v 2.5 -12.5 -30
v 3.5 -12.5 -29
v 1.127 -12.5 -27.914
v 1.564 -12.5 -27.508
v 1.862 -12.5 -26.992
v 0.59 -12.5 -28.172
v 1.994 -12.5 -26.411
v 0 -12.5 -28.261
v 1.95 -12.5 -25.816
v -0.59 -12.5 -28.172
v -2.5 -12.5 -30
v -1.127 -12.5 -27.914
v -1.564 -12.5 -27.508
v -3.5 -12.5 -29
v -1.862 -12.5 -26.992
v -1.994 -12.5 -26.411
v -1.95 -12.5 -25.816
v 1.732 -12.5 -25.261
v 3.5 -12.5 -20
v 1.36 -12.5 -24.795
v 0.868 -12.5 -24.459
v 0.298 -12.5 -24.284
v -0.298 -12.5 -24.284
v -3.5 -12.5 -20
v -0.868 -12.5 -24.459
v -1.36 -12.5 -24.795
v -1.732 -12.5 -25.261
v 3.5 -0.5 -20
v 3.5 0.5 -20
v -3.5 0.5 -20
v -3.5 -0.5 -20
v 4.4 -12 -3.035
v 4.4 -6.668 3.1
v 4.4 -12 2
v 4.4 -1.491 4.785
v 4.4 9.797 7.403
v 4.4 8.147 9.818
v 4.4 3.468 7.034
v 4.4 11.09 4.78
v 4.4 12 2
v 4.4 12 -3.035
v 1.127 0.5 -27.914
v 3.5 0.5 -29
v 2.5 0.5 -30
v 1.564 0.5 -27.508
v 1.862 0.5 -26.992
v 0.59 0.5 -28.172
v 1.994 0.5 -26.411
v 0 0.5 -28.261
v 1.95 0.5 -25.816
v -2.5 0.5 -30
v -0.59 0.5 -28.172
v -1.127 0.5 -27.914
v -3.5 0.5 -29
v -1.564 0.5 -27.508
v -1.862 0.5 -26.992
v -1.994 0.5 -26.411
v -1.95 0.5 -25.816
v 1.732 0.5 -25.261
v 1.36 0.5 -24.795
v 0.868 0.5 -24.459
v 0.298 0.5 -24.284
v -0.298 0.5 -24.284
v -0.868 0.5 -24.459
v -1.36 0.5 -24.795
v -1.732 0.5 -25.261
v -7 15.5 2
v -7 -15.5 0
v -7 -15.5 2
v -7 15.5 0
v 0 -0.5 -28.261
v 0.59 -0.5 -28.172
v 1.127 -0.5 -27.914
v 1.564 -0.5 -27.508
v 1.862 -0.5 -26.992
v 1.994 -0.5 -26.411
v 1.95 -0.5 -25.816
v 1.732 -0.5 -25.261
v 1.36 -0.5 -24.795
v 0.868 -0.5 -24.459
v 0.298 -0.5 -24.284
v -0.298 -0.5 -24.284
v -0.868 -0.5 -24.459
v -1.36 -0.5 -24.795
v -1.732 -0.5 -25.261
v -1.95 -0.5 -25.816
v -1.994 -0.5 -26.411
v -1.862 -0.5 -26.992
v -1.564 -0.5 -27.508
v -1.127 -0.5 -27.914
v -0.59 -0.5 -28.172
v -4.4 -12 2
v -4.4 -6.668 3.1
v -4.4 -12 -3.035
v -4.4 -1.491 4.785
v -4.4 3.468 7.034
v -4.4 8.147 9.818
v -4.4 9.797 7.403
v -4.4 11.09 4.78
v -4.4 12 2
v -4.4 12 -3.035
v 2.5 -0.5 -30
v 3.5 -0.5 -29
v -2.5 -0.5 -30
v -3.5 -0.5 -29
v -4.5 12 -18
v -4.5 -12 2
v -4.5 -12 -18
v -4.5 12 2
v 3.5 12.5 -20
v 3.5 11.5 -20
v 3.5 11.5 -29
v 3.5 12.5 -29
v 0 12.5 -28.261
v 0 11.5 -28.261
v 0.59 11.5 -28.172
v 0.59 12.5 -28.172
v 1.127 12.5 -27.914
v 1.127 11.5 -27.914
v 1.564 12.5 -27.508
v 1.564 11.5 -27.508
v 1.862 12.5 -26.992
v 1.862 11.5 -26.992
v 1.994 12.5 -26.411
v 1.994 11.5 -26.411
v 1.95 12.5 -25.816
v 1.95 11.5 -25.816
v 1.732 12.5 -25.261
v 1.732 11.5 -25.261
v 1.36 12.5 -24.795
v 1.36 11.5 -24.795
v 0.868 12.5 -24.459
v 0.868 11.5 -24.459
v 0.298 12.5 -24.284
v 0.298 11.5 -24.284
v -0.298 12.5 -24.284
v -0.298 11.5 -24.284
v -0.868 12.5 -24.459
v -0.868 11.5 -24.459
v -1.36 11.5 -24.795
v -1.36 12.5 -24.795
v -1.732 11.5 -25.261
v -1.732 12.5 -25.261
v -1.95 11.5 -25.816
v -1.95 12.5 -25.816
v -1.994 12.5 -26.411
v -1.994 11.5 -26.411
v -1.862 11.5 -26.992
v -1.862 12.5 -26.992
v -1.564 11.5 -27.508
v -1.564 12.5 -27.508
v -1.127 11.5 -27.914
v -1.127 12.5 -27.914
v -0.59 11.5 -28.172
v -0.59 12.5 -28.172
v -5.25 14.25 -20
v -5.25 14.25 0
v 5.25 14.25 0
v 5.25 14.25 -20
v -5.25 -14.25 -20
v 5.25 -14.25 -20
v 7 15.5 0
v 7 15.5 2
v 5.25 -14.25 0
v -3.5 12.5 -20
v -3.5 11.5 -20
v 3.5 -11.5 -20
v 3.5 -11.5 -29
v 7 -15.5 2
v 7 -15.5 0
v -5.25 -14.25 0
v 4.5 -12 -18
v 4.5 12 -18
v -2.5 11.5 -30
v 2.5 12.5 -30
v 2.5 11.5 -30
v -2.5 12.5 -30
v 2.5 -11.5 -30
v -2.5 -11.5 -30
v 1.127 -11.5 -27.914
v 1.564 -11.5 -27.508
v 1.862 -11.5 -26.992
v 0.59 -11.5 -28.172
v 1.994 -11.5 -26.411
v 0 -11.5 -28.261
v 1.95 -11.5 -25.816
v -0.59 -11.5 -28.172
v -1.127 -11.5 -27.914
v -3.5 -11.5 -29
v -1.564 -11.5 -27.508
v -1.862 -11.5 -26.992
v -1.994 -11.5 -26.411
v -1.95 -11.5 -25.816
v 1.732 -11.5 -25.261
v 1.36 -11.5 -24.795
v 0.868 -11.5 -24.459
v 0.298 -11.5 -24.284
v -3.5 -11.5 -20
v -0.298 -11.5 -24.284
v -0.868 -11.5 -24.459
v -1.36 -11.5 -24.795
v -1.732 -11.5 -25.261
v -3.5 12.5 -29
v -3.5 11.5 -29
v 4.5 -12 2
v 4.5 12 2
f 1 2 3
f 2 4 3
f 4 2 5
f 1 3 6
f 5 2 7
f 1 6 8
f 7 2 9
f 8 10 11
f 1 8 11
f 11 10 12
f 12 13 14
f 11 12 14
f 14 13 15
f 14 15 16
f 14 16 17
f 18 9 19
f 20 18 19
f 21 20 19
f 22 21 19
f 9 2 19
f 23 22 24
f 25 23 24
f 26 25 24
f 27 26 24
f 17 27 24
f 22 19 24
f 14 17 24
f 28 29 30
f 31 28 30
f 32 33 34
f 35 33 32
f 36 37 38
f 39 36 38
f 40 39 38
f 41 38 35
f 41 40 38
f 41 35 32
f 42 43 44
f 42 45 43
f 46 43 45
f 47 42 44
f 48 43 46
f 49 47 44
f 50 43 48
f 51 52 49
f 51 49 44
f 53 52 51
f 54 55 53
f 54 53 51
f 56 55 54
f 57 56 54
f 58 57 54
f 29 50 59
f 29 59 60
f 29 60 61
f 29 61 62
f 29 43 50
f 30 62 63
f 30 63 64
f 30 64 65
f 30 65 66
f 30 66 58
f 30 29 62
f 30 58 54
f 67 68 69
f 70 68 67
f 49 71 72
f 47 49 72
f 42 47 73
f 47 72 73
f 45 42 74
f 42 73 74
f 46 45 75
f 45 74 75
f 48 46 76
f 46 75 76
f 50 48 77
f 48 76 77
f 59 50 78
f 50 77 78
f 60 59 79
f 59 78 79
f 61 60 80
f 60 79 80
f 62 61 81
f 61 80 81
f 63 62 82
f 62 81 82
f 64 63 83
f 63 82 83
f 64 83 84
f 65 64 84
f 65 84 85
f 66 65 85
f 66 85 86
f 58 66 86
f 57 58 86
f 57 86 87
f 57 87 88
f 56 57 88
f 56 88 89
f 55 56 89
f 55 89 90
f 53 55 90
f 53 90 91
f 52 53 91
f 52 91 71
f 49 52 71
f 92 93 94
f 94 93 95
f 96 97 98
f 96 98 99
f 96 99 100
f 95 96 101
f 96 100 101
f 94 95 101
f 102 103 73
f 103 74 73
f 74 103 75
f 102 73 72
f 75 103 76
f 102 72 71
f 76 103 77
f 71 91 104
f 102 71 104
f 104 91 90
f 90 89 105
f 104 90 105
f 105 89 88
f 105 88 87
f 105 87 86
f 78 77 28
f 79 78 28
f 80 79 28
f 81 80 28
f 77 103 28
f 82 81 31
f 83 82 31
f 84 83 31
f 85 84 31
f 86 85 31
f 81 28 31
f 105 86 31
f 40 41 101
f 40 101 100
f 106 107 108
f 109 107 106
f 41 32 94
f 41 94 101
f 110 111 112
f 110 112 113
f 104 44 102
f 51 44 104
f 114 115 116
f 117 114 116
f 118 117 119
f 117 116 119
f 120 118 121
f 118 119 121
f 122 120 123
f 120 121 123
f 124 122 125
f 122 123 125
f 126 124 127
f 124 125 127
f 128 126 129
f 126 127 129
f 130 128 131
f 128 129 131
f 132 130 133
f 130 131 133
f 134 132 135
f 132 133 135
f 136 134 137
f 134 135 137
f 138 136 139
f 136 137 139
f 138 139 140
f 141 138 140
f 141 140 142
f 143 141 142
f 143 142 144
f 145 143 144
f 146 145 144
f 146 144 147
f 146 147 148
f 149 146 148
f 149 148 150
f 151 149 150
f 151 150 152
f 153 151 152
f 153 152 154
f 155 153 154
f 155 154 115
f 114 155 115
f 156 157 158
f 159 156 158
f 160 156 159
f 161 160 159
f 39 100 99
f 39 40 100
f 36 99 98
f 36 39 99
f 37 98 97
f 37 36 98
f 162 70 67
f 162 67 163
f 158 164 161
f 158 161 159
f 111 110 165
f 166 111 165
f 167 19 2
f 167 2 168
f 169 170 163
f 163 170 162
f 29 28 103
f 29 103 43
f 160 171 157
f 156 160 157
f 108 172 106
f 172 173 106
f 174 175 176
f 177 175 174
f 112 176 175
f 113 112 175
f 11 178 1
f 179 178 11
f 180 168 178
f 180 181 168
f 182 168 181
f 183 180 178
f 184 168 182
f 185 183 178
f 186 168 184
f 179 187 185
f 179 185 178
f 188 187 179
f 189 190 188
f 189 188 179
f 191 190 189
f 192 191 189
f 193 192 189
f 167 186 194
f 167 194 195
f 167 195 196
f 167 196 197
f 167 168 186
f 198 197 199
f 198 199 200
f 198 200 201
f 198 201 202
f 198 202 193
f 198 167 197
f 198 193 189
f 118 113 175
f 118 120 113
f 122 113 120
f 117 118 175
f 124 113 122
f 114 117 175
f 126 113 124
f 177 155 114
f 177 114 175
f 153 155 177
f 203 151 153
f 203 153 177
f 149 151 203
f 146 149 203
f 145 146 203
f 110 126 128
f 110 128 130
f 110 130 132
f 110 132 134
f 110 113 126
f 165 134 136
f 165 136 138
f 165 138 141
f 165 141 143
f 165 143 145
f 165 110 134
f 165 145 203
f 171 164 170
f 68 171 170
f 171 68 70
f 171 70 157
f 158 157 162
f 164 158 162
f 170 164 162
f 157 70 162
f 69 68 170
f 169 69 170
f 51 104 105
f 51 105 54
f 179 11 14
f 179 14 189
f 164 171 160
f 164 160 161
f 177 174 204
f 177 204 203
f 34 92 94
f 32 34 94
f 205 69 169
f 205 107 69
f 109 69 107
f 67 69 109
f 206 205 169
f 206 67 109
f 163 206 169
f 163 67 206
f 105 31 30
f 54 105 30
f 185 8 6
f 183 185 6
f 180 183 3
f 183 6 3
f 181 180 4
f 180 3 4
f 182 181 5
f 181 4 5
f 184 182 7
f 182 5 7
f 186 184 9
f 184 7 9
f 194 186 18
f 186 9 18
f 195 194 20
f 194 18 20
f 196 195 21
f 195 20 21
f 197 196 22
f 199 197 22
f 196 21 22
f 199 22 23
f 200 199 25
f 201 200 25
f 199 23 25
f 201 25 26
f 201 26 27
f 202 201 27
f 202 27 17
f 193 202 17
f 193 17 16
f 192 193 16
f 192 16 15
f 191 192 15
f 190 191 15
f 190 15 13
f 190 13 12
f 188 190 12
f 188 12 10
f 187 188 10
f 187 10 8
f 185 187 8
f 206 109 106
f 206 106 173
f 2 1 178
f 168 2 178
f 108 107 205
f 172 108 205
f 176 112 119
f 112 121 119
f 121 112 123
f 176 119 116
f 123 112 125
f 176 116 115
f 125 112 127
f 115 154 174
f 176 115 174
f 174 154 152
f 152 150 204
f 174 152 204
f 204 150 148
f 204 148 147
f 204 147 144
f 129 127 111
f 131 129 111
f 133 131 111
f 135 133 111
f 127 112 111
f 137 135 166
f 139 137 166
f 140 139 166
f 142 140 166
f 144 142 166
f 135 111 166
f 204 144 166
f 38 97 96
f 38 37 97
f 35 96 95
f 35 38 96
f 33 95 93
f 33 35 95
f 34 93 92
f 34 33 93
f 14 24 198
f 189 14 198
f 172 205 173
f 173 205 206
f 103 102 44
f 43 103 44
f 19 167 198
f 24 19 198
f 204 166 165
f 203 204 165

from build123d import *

# Parameters (mm, degrees)
SKETCH1_W           = 14
SKETCH1_H           = 31
SKETCH1_W_2         = 9
SKETCH1_H_2         = 24
BOSS_EXTRUDE1_DEPTH = 2
SKETCH2_W           = 10.5
SKETCH2_H           = 28.5
SKETCH2_W_2         = 9
SKETCH2_H_2         = 24
BOSS_EXTRUDE2_DEPTH = 20
SKETCH3_W           = 10.5
SKETCH3_H           = 28.5
BOSS_EXTRUDE3_DEPTH = 2
SKETCH4_W           = 7
SKETCH4_H           = 1
BOSS_EXTRUDE4_DEPTH = 10
CHAMFER1_SIZE       = 1
LPATTERN1_COUNT     = 2
LPATTERN1_PITCH     = 12
LPATTERN1_2_COUNT   = 2
LPATTERN1_2_PITCH   = 12
SKETCH6_R           = 2
CUT_EXTRUDE1_DEPTH  = 42.629316593
BOSS_EXTRUDE5_DEPTH = 4.4


with BuildPart() as part:
    # Sketch1 → Boss-Extrude1 (new body)
    with BuildSketch(Plane.XY):
        Rectangle(SKETCH1_W, SKETCH1_H)
        Rectangle(SKETCH1_W_2, SKETCH1_H_2, mode=Mode.SUBTRACT)
    extrude(amount=BOSS_EXTRUDE1_DEPTH)

    # Sketch2 → Boss-Extrude2 (add)
    with BuildSketch(Plane.XY):
        Rectangle(SKETCH2_W, SKETCH2_H)
        Rectangle(SKETCH2_W_2, SKETCH2_H_2, mode=Mode.SUBTRACT)
    extrude(amount=-BOSS_EXTRUDE2_DEPTH)

    # Sketch3 → Boss-Extrude3 (add)
    with BuildSketch(Plane(origin=(0, 0, -20), x_dir=(-1, 0, 0), z_dir=(0, 0, -1))):
        Rectangle(SKETCH3_W, SKETCH3_H)
    extrude(amount=-BOSS_EXTRUDE3_DEPTH)


with BuildPart() as body_2:
    # Sketch4 → Boss-Extrude4 (new body)
    with BuildSketch(Plane(origin=(0, 0, -20), x_dir=(-1, 0, 0), z_dir=(0, 0, -1))):
        Rectangle(SKETCH4_W, SKETCH4_H)
    extrude(amount=BOSS_EXTRUDE4_DEPTH)

    # Chamfer1
    chamfer1_edges = [body_2.edges().sort_by_distance(p)[0] for p in [
        (3.5, 0, -30),
        (-3.5, 0, -30),
    ]]
    chamfer(chamfer1_edges, length=CHAMFER1_SIZE)


with BuildPart() as lpattern1_1:
    # LPattern1: pattern copy
    add(body_2.part.moved(Location(Vector(0, -1, 0) * (1 * LPATTERN1_PITCH))))


with BuildPart() as lpattern1_2_1:
    # LPattern1 2: pattern copy
    add(body_2.part.moved(Location(Vector(0, 1, 0) * (1 * LPATTERN1_2_PITCH))))


with BuildPart() as cut_extrude1_tool:
    # Sketch6 → Cut-Extrude1 (new, through all)
    with BuildSketch(Plane.XZ.offset(12.5)):
        with Locations(Location((0, -26.261190852, 0), (0, 0, 270))):
            Circle(SKETCH6_R)
    extrude(amount=-CUT_EXTRUDE1_DEPTH)


with BuildPart() as body_2_1:
    add(body_2.part)

    # Cut-Extrude1: cut by cut_extrude1_tool
    add(cut_extrude1_tool.part, mode=Mode.SUBTRACT)


with BuildPart() as lpattern1_1_1:
    add(lpattern1_1.part)

    # Cut-Extrude1: cut by cut_extrude1_tool
    add(cut_extrude1_tool.part, mode=Mode.SUBTRACT)


with BuildPart() as lpattern1_2_1_1:
    add(lpattern1_2_1.part)

    # Cut-Extrude1: cut by cut_extrude1_tool
    add(cut_extrude1_tool.part, mode=Mode.SUBTRACT)


with BuildPart() as body_5:
    # Sketch7 → Boss-Extrude5 (new, symmetric)
    with BuildSketch(Plane(origin=(0, 0, 0), x_dir=(0, 0, -1), z_dir=(1, 0, 0))):
        with BuildLine():
            Line((-2, -12), (3.035249644, -12))
            Line((3.035249644, -12), (3.035249644, 12))
            Line((3.035249644, 12), (-2, 12))
            ThreePointArc((-2, 12), (-6.114287528, 10.489568636), (-9.818258603, 8.14662966))
            ThreePointArc((-9.818258603, 8.14662966), (-4.785245382, -1.49054199), (-2, -12))
        make_face()
    extrude(amount=BOSS_EXTRUDE5_DEPTH, both=True)


solid = Compound([part.part, body_2_1.part, lpattern1_1_1.part, lpattern1_2_1_1.part, body_5.part])
